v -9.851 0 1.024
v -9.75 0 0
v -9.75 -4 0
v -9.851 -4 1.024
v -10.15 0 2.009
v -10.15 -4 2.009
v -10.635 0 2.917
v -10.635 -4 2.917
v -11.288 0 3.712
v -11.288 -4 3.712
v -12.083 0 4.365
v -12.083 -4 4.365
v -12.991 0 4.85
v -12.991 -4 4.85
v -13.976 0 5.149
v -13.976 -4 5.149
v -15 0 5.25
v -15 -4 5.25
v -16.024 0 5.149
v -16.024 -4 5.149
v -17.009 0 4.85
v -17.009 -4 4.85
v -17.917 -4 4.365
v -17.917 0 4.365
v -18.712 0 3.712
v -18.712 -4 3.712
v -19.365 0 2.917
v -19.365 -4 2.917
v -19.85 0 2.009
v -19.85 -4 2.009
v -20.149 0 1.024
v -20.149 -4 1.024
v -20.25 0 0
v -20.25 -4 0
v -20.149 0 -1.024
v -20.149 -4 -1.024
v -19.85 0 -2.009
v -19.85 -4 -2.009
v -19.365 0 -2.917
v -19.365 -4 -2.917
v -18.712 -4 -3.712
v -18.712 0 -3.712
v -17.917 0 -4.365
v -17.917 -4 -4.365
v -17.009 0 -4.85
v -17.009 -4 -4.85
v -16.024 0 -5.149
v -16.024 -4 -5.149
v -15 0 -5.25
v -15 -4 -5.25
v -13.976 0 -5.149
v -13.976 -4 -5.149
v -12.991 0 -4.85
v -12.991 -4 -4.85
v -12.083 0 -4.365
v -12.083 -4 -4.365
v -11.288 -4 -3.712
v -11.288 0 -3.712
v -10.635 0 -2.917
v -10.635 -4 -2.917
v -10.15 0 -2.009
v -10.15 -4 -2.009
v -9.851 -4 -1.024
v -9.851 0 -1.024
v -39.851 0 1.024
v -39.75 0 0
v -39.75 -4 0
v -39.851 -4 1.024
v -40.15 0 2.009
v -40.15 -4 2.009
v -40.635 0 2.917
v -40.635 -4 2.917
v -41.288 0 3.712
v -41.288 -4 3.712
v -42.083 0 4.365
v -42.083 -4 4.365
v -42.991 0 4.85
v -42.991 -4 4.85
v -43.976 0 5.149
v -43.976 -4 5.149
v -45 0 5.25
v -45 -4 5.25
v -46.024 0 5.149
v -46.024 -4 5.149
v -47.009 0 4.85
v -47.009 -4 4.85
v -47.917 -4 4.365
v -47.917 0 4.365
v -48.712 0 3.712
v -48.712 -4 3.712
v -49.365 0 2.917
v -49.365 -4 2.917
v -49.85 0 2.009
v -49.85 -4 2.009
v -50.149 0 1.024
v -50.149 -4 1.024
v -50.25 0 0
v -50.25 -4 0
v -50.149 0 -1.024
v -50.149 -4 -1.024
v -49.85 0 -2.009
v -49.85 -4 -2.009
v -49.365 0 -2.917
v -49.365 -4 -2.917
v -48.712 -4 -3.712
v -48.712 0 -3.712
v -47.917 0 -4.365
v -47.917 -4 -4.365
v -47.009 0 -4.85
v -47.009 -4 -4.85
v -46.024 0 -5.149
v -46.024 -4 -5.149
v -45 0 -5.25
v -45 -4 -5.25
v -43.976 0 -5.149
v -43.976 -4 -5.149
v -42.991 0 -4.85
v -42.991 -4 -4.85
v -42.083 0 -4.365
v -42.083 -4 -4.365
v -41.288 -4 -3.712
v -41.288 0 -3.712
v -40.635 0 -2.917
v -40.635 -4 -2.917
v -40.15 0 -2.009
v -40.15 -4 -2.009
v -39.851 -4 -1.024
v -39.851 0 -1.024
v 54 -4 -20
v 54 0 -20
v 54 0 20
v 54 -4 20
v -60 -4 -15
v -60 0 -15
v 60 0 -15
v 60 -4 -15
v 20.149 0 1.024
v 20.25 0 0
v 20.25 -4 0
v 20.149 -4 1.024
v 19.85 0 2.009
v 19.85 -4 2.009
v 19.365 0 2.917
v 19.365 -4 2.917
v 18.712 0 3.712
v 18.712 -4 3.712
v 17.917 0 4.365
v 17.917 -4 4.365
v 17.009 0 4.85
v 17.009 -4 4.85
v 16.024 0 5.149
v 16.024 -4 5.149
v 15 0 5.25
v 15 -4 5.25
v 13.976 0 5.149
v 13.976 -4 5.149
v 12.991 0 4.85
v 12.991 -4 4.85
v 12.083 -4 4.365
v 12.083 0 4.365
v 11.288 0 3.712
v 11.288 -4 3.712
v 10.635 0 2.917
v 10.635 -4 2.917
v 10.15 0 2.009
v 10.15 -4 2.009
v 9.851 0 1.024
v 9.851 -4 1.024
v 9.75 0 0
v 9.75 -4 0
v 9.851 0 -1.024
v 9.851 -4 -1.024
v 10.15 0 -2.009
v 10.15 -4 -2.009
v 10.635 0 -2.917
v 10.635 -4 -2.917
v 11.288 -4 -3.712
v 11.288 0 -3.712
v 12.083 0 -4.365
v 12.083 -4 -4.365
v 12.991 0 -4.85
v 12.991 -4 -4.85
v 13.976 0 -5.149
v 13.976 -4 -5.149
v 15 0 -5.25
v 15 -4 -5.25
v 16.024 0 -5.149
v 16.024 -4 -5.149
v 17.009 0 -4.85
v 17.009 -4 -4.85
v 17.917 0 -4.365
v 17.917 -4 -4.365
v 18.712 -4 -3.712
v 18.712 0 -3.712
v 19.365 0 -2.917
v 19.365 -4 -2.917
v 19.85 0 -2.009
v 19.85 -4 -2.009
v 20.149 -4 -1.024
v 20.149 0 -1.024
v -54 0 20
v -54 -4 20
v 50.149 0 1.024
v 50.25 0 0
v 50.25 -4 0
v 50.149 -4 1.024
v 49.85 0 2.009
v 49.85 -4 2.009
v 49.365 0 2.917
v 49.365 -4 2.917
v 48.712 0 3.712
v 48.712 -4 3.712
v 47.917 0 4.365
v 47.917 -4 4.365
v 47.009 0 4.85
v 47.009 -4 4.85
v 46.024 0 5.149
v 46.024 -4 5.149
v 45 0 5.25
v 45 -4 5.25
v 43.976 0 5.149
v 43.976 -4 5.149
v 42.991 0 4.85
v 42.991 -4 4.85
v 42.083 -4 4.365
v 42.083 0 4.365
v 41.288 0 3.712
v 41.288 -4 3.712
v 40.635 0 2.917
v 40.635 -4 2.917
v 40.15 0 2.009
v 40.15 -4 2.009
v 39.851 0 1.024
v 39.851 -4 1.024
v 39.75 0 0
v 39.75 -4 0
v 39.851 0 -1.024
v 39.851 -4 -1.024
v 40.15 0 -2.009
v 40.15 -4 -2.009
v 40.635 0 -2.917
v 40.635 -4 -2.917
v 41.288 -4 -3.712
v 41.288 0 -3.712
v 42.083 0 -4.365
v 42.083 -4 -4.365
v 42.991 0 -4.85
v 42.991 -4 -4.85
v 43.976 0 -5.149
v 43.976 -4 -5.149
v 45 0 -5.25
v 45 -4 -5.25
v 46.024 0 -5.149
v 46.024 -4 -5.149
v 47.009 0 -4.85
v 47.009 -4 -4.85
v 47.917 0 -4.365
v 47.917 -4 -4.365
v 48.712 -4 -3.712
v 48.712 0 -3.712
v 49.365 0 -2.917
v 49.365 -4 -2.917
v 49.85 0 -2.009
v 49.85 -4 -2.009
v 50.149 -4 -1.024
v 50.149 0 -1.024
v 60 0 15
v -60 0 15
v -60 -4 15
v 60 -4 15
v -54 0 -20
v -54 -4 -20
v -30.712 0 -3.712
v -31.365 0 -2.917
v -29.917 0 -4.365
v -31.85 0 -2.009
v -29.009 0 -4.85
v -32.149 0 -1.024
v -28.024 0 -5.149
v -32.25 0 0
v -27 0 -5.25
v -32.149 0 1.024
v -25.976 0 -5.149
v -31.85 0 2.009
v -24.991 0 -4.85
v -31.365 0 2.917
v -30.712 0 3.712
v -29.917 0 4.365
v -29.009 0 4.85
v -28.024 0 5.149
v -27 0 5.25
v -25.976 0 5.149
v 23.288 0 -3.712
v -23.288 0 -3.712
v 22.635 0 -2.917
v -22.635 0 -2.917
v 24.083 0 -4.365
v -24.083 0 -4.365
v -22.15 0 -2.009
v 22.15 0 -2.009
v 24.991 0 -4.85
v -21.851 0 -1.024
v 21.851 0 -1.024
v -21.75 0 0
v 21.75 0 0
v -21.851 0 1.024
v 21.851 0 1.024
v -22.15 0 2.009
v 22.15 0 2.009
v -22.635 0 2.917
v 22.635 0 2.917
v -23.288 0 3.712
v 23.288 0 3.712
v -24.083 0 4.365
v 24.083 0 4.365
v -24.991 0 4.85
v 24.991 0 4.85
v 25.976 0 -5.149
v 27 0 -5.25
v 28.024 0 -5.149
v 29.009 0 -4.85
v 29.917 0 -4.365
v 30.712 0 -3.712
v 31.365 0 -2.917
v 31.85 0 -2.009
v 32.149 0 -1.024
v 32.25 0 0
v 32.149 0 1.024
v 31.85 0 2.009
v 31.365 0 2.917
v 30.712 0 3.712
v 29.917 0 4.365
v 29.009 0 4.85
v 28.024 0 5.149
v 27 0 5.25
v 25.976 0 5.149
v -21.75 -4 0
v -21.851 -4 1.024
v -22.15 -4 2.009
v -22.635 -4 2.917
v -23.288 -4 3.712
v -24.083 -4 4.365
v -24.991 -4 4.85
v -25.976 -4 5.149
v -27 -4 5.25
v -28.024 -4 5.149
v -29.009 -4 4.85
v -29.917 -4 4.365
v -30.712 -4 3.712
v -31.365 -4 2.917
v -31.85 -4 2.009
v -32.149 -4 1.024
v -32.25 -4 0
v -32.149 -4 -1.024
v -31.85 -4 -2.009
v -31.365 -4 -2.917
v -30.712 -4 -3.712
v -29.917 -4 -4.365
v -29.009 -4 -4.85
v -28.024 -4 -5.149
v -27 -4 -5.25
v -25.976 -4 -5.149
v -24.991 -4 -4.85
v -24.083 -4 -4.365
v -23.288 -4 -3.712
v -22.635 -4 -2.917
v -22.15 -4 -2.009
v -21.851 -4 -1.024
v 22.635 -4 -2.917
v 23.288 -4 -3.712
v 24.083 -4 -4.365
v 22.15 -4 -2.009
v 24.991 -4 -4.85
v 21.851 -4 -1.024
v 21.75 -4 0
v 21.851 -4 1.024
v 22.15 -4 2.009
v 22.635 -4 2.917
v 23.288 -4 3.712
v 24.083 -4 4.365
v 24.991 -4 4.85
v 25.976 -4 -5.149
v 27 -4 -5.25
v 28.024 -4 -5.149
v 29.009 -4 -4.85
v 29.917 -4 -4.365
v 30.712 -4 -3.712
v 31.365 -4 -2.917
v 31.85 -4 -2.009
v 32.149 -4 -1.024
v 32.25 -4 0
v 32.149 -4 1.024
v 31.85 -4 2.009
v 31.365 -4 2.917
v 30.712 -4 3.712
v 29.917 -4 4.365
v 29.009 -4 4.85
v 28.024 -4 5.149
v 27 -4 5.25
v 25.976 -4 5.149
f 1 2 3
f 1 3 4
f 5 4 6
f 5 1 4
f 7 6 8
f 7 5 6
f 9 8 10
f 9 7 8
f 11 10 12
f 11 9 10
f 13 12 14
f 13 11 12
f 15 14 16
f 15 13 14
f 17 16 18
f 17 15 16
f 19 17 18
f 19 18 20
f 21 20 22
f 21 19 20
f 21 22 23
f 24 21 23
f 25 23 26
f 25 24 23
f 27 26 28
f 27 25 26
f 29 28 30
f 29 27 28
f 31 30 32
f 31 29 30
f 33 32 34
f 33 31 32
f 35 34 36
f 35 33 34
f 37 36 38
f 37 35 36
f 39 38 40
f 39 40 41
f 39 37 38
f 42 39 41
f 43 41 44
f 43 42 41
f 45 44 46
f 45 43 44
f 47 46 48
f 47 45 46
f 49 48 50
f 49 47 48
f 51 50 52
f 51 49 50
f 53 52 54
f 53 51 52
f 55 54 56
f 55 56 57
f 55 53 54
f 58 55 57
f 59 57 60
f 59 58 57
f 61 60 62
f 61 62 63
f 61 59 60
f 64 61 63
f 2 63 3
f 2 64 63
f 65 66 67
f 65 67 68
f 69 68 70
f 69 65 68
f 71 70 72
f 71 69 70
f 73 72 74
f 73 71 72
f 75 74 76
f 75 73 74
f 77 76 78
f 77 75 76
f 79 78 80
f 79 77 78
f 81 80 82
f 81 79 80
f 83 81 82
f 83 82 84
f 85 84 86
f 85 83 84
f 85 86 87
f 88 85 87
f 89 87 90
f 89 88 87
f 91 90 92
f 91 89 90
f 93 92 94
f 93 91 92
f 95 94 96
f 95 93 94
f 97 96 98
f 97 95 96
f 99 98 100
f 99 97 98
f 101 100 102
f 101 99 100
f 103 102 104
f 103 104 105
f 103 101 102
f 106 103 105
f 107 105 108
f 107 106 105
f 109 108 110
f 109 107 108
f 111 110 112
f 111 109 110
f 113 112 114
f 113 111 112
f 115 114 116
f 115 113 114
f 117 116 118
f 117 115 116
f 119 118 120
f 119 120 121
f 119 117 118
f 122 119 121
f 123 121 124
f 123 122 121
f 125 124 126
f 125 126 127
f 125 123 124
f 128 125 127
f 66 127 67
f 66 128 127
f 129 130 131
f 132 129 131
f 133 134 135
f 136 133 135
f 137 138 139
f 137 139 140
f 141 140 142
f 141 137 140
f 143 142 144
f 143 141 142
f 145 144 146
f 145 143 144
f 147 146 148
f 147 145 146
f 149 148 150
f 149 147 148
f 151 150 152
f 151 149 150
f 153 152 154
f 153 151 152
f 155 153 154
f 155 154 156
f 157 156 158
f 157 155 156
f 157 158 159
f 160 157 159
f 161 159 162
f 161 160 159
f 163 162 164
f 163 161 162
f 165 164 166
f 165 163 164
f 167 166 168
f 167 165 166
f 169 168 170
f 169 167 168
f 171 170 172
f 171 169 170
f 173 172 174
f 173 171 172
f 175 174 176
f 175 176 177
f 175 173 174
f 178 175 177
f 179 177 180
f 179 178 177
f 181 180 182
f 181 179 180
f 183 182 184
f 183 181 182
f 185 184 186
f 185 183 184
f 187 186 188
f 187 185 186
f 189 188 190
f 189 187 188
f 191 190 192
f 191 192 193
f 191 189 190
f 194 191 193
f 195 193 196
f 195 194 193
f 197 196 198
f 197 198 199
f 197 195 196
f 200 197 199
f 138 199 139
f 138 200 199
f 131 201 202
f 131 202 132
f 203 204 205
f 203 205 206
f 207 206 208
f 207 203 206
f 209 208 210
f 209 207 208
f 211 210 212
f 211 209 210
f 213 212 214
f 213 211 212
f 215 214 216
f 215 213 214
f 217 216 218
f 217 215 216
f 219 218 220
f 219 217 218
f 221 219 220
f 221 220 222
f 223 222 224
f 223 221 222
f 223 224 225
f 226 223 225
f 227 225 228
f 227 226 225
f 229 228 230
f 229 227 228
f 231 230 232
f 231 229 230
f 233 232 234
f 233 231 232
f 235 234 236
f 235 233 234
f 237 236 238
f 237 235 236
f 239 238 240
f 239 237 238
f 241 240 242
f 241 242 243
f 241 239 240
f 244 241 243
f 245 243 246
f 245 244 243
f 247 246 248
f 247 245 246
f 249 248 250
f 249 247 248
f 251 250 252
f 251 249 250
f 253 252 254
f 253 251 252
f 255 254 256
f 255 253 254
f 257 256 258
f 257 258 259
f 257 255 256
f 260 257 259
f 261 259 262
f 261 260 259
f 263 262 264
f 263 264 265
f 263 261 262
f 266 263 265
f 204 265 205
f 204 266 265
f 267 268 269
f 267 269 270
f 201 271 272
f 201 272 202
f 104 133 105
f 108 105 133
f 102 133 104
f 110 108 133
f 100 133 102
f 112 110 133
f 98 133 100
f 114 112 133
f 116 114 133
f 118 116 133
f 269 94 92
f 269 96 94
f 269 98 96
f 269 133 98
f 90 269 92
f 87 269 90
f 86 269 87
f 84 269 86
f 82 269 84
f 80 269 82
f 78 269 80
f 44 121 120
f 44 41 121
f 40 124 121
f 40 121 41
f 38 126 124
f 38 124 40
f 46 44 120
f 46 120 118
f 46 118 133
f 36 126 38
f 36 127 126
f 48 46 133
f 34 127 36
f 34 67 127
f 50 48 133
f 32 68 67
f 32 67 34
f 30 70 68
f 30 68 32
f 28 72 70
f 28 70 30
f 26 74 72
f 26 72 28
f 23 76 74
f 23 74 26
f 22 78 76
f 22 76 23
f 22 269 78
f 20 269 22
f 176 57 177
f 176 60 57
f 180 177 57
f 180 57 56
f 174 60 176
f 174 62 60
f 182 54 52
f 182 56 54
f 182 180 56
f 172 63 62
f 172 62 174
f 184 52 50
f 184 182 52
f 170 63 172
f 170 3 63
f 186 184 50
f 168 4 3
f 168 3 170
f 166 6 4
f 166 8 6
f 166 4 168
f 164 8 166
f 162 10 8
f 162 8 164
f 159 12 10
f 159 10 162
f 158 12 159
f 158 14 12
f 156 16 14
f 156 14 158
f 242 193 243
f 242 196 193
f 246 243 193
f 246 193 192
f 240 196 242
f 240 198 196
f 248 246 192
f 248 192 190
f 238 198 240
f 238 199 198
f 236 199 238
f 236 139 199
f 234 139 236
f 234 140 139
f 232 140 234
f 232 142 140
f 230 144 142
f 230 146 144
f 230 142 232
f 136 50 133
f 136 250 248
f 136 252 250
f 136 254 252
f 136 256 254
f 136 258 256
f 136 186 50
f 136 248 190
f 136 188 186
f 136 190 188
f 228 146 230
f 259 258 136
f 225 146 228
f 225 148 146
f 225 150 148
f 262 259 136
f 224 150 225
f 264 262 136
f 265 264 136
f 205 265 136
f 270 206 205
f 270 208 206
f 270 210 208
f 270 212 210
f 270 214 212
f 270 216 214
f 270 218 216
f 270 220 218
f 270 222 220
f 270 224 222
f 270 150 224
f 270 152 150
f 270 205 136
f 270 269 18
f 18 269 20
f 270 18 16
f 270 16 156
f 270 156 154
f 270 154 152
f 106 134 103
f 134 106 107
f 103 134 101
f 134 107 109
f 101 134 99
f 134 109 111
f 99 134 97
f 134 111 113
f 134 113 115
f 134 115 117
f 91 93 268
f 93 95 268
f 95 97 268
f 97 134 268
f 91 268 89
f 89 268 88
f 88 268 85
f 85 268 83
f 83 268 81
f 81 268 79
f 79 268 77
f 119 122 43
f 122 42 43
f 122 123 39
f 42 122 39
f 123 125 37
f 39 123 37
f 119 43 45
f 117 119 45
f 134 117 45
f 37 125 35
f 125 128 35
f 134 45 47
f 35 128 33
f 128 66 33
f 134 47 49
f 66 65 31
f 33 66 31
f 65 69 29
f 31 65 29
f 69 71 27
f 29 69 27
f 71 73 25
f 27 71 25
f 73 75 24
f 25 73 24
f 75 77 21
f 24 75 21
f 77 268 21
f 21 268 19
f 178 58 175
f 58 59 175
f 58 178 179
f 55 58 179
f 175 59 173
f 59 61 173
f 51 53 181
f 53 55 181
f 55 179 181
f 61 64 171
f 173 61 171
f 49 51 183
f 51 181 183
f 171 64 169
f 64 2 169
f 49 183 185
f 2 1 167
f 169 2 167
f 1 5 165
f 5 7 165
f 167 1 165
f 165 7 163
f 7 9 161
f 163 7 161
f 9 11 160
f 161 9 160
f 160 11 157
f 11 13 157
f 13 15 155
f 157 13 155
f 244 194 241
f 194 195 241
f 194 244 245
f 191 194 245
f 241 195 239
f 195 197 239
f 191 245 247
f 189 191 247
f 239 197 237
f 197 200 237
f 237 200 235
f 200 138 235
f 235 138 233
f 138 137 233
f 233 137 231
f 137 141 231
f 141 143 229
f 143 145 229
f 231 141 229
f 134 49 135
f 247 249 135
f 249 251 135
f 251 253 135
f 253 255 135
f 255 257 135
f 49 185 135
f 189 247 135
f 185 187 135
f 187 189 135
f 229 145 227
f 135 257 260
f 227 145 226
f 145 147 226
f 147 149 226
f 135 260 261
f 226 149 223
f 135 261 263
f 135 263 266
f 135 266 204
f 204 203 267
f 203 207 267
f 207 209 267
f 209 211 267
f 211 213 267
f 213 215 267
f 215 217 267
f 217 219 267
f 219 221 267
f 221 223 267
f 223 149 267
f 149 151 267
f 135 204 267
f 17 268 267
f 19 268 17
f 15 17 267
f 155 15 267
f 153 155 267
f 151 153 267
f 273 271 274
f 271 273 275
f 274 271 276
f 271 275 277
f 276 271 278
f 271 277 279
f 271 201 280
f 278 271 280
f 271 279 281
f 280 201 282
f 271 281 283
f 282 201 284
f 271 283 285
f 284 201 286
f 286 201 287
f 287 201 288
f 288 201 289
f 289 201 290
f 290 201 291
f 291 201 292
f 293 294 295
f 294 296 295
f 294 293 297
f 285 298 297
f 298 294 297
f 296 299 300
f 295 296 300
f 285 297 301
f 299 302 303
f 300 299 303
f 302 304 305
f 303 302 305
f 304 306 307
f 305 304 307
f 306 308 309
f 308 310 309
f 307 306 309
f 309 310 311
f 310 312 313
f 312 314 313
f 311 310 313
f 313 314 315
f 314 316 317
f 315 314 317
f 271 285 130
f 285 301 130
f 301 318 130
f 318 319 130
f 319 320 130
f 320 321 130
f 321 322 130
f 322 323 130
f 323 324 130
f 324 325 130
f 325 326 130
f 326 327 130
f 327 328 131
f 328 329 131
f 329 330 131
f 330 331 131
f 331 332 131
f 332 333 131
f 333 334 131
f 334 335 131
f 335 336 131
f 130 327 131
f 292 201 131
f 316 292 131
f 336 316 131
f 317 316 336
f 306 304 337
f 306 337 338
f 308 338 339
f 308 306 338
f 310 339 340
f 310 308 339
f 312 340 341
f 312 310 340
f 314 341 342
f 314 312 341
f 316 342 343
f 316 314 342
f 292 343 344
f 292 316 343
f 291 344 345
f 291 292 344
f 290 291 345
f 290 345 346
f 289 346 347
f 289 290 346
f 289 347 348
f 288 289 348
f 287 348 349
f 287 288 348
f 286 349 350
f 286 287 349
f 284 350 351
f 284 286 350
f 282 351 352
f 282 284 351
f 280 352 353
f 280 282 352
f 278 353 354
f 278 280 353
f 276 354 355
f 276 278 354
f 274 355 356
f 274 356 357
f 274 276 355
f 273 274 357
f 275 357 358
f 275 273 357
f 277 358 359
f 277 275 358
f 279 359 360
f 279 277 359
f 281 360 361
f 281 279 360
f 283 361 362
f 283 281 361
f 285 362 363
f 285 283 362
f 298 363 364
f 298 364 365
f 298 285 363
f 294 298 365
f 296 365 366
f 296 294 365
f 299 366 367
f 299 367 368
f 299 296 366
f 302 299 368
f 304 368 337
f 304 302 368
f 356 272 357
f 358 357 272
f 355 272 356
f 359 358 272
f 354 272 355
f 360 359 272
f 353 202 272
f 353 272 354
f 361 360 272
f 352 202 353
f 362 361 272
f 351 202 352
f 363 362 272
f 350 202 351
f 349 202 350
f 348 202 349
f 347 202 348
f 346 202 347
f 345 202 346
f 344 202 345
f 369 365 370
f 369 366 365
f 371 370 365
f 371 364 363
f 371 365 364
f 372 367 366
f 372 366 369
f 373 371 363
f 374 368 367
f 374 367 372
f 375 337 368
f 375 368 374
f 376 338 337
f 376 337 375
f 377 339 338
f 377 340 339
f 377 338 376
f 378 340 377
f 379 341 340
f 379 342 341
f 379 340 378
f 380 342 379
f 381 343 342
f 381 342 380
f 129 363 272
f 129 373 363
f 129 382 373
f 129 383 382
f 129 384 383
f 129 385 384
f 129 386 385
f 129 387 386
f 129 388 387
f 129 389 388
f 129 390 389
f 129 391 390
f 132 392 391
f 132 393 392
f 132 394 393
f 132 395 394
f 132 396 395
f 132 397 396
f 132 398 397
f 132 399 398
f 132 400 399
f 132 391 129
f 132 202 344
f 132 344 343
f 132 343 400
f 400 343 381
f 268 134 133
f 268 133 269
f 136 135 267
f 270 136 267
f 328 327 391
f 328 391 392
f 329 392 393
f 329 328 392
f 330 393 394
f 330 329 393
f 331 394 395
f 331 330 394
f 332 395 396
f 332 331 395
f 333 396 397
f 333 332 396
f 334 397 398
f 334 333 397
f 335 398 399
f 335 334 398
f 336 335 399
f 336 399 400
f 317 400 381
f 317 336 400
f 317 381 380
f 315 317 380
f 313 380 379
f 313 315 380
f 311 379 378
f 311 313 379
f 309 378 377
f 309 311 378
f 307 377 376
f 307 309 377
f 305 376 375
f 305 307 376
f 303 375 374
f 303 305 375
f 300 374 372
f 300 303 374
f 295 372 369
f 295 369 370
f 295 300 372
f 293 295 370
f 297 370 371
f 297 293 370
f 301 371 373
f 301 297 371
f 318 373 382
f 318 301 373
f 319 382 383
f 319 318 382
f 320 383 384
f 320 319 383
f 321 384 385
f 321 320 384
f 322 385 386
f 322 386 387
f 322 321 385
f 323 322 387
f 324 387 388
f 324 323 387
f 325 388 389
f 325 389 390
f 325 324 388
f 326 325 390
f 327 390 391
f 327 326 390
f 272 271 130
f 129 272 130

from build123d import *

# Parameters (mm, degrees)
F0_W     = 120
F0_H     = 30
F0_R     = 5.25
F1_DEPTH = 4
F2_W     = 108
F2_H     = 40
F2_R     = 5.25
F3_DEPTH = 4


with BuildPart() as f1:
    # F0 (on Front) → F1 (new body)
    with BuildSketch(Plane.XZ):
        Rectangle(F0_W, F0_H)
        with Locations((-45, 0)):
            Circle(F0_R, mode=Mode.SUBTRACT)
        with Locations((-15, 0)):
            Circle(F0_R, mode=Mode.SUBTRACT)
        with Locations((15, 0)):
            Circle(F0_R, mode=Mode.SUBTRACT)
        with Locations((45, 0)):
            Circle(F0_R, mode=Mode.SUBTRACT)
    extrude(amount=F1_DEPTH)


with BuildPart() as f3:
    # F2 (on Front) → F3 (new body)
    with BuildSketch(Plane.XZ):
        Rectangle(F2_W, F2_H)
        with Locations((-27, 0)):
            Circle(F2_R, mode=Mode.SUBTRACT)
        with Locations((27, 0)):
            Circle(F2_R, mode=Mode.SUBTRACT)
    extrude(amount=F3_DEPTH)


solid = Compound([f1.part, f3.part])
